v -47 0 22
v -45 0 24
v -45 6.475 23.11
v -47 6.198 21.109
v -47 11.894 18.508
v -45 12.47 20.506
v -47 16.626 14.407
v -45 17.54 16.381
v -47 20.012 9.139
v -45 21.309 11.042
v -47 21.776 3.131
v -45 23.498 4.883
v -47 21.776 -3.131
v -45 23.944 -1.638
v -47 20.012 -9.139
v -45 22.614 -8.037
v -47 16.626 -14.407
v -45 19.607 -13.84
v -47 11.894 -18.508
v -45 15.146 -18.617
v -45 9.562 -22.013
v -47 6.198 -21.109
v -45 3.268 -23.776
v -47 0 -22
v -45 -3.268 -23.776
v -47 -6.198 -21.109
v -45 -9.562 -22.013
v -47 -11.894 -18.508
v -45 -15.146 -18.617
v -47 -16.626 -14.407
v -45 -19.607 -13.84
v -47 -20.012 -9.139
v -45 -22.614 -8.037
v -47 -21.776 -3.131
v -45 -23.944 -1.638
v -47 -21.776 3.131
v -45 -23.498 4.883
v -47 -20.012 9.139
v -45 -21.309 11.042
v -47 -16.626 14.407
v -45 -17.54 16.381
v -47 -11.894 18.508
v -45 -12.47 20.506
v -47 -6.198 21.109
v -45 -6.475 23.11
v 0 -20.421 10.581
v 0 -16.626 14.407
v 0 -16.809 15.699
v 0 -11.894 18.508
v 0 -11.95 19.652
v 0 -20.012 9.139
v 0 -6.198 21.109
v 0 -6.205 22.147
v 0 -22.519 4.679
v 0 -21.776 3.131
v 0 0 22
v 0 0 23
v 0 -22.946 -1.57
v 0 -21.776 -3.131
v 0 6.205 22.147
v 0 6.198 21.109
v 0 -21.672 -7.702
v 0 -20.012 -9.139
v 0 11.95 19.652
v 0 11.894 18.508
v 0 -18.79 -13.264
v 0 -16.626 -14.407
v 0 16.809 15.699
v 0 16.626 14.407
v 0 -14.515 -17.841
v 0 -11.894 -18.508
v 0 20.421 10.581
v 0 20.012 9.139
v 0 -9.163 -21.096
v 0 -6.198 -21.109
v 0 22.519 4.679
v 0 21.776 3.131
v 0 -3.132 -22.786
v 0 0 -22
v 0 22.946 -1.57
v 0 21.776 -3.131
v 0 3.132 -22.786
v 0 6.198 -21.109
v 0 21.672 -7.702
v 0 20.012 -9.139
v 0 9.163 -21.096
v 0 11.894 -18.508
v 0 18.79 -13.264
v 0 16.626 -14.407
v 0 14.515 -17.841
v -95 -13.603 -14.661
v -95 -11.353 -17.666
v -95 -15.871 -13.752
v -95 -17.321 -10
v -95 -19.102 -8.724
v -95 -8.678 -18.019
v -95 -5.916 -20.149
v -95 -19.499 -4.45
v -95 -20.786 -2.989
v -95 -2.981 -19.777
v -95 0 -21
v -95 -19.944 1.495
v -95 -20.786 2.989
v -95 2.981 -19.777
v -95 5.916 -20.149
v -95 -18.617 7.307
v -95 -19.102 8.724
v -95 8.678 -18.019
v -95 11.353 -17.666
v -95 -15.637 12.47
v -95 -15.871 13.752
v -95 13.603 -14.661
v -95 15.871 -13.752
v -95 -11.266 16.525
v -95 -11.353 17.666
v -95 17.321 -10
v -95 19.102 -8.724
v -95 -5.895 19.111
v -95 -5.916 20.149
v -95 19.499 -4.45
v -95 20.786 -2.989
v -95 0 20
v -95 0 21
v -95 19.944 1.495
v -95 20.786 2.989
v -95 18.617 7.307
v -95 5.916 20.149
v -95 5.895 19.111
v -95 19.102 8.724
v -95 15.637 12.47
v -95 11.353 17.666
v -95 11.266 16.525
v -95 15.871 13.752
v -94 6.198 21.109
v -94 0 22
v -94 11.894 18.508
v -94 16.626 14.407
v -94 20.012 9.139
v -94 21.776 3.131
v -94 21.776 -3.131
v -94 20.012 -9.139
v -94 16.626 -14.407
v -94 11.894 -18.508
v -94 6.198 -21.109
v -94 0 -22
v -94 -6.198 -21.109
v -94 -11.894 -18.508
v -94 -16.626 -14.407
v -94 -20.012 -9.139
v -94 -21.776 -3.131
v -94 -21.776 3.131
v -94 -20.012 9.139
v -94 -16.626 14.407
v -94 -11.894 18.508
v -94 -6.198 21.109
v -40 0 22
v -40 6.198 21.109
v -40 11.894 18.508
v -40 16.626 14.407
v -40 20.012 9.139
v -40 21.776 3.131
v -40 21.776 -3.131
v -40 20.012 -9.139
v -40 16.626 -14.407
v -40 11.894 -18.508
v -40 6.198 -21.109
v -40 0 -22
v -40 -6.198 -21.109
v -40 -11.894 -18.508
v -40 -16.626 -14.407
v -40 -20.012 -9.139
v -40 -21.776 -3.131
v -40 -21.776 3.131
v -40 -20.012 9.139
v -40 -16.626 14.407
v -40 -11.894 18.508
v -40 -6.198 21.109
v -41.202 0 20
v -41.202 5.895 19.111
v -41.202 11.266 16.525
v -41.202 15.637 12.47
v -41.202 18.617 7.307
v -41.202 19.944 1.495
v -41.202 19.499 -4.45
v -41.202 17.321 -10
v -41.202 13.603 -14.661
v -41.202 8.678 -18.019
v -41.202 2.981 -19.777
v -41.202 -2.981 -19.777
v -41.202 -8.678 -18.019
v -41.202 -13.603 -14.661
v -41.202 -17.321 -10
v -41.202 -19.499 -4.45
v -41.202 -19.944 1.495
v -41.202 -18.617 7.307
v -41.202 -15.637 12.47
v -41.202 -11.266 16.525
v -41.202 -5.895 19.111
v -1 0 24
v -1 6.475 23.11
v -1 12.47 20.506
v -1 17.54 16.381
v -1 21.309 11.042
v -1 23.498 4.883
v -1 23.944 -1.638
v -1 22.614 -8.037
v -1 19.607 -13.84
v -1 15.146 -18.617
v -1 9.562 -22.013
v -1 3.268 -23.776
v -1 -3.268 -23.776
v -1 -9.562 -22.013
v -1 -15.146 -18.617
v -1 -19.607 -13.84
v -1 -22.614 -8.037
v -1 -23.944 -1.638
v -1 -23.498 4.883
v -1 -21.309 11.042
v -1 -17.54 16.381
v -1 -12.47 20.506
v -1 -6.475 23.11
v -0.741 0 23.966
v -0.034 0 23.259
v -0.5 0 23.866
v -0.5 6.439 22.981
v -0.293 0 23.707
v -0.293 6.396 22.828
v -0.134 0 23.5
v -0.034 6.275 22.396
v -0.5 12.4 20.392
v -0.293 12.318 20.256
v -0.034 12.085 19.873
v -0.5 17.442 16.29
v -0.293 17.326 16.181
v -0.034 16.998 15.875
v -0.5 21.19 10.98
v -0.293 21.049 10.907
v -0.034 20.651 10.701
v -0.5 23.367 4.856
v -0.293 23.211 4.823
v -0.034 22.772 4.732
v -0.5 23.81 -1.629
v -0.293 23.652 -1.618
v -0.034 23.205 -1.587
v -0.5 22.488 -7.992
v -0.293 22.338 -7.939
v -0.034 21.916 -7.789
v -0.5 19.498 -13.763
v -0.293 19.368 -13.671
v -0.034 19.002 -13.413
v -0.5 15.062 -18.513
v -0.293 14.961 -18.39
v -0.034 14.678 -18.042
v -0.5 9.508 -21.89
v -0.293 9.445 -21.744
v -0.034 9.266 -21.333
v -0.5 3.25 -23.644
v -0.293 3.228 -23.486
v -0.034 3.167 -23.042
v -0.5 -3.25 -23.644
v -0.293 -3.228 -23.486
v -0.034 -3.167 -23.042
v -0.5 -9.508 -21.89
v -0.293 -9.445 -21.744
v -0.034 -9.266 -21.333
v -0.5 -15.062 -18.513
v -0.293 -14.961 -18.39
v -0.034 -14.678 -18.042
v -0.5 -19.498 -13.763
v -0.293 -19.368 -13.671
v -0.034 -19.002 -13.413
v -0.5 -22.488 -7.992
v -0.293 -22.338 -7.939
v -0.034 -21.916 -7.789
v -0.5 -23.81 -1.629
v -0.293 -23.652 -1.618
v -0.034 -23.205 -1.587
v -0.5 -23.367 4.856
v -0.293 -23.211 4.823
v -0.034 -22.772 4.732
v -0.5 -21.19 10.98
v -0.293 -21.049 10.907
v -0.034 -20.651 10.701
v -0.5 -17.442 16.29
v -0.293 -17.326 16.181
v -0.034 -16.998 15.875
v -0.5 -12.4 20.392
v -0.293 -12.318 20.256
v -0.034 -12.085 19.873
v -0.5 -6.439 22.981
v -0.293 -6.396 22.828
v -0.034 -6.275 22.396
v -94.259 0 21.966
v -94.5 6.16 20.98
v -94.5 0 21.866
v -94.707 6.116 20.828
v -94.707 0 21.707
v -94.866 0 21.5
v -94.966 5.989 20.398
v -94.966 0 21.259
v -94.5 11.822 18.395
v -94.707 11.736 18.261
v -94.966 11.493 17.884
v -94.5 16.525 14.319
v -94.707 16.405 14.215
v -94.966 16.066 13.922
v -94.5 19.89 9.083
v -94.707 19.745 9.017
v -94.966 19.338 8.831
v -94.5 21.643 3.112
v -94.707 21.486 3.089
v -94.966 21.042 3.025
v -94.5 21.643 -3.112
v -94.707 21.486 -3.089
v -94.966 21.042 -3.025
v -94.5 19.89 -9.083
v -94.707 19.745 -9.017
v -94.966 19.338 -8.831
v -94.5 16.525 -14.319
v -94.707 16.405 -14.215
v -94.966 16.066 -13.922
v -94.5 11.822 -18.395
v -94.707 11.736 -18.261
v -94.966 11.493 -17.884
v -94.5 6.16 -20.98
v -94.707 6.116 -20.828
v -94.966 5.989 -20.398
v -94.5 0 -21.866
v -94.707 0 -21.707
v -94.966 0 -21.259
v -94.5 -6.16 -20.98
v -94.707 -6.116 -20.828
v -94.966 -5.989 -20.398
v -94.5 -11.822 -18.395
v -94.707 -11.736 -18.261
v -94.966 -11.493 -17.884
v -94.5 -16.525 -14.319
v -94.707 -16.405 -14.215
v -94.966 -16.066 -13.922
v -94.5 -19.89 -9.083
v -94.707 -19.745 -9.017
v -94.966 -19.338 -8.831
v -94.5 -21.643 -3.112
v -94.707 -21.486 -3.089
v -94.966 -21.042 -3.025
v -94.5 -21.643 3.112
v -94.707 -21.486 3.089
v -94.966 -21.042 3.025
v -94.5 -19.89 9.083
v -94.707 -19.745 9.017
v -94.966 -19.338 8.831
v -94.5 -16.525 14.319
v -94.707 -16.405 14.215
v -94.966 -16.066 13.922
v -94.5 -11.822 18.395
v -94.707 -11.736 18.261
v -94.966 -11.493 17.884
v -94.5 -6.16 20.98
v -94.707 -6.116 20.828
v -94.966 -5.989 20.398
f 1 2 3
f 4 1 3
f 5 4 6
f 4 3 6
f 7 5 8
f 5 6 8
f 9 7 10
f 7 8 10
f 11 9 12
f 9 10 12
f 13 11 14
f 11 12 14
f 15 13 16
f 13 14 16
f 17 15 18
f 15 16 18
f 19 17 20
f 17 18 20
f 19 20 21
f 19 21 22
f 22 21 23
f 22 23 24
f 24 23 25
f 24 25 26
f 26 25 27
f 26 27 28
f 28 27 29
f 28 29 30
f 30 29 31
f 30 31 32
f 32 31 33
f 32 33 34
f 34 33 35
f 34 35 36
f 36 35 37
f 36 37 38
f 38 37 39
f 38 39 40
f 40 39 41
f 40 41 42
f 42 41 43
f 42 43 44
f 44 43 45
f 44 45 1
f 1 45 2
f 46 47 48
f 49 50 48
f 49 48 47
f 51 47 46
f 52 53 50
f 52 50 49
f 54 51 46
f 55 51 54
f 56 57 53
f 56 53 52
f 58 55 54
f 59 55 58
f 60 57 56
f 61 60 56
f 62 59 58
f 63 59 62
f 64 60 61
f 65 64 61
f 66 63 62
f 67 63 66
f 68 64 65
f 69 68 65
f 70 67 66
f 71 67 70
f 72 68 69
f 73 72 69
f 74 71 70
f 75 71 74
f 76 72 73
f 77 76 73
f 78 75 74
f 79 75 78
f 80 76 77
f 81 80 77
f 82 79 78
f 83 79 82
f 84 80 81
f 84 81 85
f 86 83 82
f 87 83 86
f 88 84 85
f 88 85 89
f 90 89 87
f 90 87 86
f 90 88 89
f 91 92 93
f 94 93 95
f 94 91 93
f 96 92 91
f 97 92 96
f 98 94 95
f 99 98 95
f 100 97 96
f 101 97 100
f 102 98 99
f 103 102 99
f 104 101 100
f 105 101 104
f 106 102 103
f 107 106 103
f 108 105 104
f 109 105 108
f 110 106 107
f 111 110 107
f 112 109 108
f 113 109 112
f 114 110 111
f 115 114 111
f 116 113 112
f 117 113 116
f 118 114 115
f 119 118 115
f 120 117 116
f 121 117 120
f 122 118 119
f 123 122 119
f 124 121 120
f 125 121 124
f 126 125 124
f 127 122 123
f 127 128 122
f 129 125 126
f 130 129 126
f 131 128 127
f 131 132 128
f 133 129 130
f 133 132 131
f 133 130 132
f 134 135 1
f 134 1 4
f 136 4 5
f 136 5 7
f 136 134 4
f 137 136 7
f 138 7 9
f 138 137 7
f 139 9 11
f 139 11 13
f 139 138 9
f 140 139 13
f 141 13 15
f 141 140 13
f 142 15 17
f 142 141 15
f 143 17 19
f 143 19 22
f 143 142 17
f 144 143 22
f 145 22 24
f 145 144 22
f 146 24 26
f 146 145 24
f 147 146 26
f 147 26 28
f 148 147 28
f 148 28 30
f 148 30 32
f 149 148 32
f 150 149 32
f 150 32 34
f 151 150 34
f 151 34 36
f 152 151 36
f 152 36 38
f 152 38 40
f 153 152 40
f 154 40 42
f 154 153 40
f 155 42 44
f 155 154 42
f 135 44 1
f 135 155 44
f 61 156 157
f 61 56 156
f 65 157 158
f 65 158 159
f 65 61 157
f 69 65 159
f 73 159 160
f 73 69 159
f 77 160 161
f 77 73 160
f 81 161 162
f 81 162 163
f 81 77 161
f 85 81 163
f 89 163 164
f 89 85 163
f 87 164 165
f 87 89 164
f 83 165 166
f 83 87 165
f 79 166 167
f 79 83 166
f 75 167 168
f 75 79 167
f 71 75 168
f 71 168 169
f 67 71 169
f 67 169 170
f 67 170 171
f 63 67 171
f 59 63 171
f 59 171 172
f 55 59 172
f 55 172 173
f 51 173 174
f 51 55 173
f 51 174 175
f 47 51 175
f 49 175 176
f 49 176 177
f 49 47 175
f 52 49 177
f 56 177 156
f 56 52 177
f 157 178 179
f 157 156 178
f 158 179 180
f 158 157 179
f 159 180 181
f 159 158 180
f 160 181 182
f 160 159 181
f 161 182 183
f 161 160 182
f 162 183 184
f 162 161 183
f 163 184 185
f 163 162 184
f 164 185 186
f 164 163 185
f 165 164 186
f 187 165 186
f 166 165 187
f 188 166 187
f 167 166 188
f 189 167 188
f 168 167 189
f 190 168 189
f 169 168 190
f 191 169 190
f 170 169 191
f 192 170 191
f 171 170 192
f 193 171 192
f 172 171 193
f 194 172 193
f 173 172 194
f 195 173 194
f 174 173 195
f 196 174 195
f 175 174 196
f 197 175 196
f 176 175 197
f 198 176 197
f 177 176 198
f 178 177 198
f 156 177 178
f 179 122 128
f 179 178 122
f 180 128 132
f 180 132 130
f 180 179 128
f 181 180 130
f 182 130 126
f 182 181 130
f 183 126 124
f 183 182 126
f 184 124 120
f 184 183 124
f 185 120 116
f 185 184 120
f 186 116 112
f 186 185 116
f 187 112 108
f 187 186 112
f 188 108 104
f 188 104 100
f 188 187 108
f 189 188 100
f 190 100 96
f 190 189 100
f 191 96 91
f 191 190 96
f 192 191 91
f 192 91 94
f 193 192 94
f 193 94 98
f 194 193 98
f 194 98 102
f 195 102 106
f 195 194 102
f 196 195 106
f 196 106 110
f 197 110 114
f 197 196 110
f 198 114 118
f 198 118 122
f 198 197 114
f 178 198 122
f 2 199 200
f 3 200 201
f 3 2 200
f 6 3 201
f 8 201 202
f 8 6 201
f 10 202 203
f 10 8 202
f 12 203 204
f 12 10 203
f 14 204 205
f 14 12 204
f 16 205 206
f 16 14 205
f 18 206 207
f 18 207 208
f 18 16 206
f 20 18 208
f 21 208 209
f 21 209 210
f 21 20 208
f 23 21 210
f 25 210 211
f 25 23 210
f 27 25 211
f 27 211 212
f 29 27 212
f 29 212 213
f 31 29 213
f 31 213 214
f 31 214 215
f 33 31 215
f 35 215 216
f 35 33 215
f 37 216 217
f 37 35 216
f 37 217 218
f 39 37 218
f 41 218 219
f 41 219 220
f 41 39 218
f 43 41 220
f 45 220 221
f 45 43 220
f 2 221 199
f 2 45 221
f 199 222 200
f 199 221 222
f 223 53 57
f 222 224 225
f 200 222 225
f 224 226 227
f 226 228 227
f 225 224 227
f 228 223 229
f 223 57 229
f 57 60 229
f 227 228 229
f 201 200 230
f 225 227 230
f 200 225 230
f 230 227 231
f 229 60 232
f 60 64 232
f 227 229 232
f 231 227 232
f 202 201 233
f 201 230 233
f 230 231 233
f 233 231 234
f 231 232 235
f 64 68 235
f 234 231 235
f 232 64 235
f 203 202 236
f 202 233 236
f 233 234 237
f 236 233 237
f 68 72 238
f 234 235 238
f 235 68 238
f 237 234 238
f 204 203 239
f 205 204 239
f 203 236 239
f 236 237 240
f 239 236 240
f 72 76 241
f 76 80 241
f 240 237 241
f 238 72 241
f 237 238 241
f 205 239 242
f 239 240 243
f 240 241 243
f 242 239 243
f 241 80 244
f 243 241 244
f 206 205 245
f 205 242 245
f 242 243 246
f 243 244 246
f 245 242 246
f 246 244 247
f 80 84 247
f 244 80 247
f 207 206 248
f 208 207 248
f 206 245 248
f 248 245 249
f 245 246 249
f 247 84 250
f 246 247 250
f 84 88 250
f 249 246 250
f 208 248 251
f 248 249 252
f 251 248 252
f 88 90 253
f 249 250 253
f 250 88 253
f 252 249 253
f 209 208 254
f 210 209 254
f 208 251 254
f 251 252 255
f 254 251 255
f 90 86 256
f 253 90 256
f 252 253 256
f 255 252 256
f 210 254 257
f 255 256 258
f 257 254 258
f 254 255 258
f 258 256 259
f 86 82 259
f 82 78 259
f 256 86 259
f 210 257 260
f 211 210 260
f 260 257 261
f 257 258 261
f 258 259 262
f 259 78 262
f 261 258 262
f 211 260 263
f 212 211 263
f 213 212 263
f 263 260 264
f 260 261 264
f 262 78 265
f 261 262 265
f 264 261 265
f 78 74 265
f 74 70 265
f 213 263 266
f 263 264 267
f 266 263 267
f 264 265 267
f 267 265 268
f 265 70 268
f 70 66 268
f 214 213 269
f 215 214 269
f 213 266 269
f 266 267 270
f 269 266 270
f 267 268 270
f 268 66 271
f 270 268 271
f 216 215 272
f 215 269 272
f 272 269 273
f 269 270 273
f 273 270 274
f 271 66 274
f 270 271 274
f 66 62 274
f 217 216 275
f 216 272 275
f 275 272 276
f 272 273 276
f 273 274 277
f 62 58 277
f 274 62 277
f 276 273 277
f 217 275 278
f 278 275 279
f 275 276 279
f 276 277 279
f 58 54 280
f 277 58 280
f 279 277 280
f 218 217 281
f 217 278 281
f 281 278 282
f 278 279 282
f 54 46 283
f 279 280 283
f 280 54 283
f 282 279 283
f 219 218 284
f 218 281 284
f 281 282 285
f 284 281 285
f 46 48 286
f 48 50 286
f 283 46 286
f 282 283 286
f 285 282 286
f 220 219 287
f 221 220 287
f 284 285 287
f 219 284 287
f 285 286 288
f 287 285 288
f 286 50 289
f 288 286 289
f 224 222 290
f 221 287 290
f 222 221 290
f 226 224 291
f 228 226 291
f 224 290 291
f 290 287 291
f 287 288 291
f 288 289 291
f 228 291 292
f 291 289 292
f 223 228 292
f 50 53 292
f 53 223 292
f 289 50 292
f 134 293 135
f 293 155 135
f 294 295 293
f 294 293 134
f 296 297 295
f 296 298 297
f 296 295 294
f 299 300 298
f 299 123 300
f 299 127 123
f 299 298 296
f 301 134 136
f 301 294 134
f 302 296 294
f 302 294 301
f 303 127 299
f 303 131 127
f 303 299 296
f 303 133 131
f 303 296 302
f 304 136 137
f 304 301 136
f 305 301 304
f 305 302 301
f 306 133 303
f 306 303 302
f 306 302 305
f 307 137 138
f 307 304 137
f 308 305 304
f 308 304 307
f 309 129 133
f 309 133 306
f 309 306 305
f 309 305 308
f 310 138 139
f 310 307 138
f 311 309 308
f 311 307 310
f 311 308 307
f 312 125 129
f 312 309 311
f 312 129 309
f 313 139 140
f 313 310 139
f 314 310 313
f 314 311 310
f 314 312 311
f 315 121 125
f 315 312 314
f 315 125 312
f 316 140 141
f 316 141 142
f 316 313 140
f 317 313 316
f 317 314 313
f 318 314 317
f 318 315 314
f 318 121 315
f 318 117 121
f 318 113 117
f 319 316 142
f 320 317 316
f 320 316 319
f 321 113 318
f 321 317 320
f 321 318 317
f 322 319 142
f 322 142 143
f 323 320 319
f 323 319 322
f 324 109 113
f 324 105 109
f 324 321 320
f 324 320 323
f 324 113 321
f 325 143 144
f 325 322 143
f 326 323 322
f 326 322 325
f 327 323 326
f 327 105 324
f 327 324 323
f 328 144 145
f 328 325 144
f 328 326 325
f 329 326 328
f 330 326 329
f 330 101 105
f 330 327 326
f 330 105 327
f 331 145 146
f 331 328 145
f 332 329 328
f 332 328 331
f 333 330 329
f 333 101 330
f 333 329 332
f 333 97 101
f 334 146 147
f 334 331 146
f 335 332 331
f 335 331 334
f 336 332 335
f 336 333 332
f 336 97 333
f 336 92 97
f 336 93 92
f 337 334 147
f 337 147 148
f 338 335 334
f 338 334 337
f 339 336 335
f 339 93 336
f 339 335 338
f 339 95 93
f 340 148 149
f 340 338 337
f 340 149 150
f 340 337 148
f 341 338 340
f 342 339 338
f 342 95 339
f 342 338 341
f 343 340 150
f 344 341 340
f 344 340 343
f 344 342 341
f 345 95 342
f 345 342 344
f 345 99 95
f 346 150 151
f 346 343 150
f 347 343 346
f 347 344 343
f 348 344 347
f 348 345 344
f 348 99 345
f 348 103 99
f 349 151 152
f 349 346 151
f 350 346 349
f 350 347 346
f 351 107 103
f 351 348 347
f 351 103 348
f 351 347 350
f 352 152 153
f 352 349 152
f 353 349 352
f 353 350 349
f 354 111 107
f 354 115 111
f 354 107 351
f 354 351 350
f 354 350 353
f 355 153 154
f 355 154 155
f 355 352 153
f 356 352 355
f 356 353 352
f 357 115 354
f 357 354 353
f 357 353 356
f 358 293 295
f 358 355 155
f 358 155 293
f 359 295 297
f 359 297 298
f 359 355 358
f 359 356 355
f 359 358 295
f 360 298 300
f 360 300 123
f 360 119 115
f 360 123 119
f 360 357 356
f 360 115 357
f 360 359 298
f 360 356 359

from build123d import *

# Parameters (mm, degrees)
F2_SIZE = 1.99999
F3_R    = 1


# Not quite as in the source:
# - a fillet or chamfer is up to 0.001 mm smaller than in the source, because OpenCascade refuses the exact size


with BuildPart() as f1:
    # F0 (on Front) → F1 (revolve)
    with BuildSketch(Plane.XZ):
        Polygon((-45, 22), (-95, 22), (-95, 20), (-41.2017212381, 20), (-40, 22), (0, 22), (0, 24), (-45, 24), align=None)
    revolve(axis=Axis((-59.3267625081, 0, 0), (-1, 0, 0)))

    # F2 (size 2 in the source; OpenCascade refuses exactly that, so slightly less here)
    f2_edges = [f1.edges().sort_by_distance(p)[0] for p in [
        (-45, 0, -22),
    ]]
    chamfer(f2_edges, length=F2_SIZE)

    # F3
    f3_edges = [f1.edges().sort_by_distance(p)[0] for p in [
        (0, 0, -24),
        (-95, 0, -22),
    ]]
    fillet(f3_edges, radius=F3_R)


solid = f1.part
